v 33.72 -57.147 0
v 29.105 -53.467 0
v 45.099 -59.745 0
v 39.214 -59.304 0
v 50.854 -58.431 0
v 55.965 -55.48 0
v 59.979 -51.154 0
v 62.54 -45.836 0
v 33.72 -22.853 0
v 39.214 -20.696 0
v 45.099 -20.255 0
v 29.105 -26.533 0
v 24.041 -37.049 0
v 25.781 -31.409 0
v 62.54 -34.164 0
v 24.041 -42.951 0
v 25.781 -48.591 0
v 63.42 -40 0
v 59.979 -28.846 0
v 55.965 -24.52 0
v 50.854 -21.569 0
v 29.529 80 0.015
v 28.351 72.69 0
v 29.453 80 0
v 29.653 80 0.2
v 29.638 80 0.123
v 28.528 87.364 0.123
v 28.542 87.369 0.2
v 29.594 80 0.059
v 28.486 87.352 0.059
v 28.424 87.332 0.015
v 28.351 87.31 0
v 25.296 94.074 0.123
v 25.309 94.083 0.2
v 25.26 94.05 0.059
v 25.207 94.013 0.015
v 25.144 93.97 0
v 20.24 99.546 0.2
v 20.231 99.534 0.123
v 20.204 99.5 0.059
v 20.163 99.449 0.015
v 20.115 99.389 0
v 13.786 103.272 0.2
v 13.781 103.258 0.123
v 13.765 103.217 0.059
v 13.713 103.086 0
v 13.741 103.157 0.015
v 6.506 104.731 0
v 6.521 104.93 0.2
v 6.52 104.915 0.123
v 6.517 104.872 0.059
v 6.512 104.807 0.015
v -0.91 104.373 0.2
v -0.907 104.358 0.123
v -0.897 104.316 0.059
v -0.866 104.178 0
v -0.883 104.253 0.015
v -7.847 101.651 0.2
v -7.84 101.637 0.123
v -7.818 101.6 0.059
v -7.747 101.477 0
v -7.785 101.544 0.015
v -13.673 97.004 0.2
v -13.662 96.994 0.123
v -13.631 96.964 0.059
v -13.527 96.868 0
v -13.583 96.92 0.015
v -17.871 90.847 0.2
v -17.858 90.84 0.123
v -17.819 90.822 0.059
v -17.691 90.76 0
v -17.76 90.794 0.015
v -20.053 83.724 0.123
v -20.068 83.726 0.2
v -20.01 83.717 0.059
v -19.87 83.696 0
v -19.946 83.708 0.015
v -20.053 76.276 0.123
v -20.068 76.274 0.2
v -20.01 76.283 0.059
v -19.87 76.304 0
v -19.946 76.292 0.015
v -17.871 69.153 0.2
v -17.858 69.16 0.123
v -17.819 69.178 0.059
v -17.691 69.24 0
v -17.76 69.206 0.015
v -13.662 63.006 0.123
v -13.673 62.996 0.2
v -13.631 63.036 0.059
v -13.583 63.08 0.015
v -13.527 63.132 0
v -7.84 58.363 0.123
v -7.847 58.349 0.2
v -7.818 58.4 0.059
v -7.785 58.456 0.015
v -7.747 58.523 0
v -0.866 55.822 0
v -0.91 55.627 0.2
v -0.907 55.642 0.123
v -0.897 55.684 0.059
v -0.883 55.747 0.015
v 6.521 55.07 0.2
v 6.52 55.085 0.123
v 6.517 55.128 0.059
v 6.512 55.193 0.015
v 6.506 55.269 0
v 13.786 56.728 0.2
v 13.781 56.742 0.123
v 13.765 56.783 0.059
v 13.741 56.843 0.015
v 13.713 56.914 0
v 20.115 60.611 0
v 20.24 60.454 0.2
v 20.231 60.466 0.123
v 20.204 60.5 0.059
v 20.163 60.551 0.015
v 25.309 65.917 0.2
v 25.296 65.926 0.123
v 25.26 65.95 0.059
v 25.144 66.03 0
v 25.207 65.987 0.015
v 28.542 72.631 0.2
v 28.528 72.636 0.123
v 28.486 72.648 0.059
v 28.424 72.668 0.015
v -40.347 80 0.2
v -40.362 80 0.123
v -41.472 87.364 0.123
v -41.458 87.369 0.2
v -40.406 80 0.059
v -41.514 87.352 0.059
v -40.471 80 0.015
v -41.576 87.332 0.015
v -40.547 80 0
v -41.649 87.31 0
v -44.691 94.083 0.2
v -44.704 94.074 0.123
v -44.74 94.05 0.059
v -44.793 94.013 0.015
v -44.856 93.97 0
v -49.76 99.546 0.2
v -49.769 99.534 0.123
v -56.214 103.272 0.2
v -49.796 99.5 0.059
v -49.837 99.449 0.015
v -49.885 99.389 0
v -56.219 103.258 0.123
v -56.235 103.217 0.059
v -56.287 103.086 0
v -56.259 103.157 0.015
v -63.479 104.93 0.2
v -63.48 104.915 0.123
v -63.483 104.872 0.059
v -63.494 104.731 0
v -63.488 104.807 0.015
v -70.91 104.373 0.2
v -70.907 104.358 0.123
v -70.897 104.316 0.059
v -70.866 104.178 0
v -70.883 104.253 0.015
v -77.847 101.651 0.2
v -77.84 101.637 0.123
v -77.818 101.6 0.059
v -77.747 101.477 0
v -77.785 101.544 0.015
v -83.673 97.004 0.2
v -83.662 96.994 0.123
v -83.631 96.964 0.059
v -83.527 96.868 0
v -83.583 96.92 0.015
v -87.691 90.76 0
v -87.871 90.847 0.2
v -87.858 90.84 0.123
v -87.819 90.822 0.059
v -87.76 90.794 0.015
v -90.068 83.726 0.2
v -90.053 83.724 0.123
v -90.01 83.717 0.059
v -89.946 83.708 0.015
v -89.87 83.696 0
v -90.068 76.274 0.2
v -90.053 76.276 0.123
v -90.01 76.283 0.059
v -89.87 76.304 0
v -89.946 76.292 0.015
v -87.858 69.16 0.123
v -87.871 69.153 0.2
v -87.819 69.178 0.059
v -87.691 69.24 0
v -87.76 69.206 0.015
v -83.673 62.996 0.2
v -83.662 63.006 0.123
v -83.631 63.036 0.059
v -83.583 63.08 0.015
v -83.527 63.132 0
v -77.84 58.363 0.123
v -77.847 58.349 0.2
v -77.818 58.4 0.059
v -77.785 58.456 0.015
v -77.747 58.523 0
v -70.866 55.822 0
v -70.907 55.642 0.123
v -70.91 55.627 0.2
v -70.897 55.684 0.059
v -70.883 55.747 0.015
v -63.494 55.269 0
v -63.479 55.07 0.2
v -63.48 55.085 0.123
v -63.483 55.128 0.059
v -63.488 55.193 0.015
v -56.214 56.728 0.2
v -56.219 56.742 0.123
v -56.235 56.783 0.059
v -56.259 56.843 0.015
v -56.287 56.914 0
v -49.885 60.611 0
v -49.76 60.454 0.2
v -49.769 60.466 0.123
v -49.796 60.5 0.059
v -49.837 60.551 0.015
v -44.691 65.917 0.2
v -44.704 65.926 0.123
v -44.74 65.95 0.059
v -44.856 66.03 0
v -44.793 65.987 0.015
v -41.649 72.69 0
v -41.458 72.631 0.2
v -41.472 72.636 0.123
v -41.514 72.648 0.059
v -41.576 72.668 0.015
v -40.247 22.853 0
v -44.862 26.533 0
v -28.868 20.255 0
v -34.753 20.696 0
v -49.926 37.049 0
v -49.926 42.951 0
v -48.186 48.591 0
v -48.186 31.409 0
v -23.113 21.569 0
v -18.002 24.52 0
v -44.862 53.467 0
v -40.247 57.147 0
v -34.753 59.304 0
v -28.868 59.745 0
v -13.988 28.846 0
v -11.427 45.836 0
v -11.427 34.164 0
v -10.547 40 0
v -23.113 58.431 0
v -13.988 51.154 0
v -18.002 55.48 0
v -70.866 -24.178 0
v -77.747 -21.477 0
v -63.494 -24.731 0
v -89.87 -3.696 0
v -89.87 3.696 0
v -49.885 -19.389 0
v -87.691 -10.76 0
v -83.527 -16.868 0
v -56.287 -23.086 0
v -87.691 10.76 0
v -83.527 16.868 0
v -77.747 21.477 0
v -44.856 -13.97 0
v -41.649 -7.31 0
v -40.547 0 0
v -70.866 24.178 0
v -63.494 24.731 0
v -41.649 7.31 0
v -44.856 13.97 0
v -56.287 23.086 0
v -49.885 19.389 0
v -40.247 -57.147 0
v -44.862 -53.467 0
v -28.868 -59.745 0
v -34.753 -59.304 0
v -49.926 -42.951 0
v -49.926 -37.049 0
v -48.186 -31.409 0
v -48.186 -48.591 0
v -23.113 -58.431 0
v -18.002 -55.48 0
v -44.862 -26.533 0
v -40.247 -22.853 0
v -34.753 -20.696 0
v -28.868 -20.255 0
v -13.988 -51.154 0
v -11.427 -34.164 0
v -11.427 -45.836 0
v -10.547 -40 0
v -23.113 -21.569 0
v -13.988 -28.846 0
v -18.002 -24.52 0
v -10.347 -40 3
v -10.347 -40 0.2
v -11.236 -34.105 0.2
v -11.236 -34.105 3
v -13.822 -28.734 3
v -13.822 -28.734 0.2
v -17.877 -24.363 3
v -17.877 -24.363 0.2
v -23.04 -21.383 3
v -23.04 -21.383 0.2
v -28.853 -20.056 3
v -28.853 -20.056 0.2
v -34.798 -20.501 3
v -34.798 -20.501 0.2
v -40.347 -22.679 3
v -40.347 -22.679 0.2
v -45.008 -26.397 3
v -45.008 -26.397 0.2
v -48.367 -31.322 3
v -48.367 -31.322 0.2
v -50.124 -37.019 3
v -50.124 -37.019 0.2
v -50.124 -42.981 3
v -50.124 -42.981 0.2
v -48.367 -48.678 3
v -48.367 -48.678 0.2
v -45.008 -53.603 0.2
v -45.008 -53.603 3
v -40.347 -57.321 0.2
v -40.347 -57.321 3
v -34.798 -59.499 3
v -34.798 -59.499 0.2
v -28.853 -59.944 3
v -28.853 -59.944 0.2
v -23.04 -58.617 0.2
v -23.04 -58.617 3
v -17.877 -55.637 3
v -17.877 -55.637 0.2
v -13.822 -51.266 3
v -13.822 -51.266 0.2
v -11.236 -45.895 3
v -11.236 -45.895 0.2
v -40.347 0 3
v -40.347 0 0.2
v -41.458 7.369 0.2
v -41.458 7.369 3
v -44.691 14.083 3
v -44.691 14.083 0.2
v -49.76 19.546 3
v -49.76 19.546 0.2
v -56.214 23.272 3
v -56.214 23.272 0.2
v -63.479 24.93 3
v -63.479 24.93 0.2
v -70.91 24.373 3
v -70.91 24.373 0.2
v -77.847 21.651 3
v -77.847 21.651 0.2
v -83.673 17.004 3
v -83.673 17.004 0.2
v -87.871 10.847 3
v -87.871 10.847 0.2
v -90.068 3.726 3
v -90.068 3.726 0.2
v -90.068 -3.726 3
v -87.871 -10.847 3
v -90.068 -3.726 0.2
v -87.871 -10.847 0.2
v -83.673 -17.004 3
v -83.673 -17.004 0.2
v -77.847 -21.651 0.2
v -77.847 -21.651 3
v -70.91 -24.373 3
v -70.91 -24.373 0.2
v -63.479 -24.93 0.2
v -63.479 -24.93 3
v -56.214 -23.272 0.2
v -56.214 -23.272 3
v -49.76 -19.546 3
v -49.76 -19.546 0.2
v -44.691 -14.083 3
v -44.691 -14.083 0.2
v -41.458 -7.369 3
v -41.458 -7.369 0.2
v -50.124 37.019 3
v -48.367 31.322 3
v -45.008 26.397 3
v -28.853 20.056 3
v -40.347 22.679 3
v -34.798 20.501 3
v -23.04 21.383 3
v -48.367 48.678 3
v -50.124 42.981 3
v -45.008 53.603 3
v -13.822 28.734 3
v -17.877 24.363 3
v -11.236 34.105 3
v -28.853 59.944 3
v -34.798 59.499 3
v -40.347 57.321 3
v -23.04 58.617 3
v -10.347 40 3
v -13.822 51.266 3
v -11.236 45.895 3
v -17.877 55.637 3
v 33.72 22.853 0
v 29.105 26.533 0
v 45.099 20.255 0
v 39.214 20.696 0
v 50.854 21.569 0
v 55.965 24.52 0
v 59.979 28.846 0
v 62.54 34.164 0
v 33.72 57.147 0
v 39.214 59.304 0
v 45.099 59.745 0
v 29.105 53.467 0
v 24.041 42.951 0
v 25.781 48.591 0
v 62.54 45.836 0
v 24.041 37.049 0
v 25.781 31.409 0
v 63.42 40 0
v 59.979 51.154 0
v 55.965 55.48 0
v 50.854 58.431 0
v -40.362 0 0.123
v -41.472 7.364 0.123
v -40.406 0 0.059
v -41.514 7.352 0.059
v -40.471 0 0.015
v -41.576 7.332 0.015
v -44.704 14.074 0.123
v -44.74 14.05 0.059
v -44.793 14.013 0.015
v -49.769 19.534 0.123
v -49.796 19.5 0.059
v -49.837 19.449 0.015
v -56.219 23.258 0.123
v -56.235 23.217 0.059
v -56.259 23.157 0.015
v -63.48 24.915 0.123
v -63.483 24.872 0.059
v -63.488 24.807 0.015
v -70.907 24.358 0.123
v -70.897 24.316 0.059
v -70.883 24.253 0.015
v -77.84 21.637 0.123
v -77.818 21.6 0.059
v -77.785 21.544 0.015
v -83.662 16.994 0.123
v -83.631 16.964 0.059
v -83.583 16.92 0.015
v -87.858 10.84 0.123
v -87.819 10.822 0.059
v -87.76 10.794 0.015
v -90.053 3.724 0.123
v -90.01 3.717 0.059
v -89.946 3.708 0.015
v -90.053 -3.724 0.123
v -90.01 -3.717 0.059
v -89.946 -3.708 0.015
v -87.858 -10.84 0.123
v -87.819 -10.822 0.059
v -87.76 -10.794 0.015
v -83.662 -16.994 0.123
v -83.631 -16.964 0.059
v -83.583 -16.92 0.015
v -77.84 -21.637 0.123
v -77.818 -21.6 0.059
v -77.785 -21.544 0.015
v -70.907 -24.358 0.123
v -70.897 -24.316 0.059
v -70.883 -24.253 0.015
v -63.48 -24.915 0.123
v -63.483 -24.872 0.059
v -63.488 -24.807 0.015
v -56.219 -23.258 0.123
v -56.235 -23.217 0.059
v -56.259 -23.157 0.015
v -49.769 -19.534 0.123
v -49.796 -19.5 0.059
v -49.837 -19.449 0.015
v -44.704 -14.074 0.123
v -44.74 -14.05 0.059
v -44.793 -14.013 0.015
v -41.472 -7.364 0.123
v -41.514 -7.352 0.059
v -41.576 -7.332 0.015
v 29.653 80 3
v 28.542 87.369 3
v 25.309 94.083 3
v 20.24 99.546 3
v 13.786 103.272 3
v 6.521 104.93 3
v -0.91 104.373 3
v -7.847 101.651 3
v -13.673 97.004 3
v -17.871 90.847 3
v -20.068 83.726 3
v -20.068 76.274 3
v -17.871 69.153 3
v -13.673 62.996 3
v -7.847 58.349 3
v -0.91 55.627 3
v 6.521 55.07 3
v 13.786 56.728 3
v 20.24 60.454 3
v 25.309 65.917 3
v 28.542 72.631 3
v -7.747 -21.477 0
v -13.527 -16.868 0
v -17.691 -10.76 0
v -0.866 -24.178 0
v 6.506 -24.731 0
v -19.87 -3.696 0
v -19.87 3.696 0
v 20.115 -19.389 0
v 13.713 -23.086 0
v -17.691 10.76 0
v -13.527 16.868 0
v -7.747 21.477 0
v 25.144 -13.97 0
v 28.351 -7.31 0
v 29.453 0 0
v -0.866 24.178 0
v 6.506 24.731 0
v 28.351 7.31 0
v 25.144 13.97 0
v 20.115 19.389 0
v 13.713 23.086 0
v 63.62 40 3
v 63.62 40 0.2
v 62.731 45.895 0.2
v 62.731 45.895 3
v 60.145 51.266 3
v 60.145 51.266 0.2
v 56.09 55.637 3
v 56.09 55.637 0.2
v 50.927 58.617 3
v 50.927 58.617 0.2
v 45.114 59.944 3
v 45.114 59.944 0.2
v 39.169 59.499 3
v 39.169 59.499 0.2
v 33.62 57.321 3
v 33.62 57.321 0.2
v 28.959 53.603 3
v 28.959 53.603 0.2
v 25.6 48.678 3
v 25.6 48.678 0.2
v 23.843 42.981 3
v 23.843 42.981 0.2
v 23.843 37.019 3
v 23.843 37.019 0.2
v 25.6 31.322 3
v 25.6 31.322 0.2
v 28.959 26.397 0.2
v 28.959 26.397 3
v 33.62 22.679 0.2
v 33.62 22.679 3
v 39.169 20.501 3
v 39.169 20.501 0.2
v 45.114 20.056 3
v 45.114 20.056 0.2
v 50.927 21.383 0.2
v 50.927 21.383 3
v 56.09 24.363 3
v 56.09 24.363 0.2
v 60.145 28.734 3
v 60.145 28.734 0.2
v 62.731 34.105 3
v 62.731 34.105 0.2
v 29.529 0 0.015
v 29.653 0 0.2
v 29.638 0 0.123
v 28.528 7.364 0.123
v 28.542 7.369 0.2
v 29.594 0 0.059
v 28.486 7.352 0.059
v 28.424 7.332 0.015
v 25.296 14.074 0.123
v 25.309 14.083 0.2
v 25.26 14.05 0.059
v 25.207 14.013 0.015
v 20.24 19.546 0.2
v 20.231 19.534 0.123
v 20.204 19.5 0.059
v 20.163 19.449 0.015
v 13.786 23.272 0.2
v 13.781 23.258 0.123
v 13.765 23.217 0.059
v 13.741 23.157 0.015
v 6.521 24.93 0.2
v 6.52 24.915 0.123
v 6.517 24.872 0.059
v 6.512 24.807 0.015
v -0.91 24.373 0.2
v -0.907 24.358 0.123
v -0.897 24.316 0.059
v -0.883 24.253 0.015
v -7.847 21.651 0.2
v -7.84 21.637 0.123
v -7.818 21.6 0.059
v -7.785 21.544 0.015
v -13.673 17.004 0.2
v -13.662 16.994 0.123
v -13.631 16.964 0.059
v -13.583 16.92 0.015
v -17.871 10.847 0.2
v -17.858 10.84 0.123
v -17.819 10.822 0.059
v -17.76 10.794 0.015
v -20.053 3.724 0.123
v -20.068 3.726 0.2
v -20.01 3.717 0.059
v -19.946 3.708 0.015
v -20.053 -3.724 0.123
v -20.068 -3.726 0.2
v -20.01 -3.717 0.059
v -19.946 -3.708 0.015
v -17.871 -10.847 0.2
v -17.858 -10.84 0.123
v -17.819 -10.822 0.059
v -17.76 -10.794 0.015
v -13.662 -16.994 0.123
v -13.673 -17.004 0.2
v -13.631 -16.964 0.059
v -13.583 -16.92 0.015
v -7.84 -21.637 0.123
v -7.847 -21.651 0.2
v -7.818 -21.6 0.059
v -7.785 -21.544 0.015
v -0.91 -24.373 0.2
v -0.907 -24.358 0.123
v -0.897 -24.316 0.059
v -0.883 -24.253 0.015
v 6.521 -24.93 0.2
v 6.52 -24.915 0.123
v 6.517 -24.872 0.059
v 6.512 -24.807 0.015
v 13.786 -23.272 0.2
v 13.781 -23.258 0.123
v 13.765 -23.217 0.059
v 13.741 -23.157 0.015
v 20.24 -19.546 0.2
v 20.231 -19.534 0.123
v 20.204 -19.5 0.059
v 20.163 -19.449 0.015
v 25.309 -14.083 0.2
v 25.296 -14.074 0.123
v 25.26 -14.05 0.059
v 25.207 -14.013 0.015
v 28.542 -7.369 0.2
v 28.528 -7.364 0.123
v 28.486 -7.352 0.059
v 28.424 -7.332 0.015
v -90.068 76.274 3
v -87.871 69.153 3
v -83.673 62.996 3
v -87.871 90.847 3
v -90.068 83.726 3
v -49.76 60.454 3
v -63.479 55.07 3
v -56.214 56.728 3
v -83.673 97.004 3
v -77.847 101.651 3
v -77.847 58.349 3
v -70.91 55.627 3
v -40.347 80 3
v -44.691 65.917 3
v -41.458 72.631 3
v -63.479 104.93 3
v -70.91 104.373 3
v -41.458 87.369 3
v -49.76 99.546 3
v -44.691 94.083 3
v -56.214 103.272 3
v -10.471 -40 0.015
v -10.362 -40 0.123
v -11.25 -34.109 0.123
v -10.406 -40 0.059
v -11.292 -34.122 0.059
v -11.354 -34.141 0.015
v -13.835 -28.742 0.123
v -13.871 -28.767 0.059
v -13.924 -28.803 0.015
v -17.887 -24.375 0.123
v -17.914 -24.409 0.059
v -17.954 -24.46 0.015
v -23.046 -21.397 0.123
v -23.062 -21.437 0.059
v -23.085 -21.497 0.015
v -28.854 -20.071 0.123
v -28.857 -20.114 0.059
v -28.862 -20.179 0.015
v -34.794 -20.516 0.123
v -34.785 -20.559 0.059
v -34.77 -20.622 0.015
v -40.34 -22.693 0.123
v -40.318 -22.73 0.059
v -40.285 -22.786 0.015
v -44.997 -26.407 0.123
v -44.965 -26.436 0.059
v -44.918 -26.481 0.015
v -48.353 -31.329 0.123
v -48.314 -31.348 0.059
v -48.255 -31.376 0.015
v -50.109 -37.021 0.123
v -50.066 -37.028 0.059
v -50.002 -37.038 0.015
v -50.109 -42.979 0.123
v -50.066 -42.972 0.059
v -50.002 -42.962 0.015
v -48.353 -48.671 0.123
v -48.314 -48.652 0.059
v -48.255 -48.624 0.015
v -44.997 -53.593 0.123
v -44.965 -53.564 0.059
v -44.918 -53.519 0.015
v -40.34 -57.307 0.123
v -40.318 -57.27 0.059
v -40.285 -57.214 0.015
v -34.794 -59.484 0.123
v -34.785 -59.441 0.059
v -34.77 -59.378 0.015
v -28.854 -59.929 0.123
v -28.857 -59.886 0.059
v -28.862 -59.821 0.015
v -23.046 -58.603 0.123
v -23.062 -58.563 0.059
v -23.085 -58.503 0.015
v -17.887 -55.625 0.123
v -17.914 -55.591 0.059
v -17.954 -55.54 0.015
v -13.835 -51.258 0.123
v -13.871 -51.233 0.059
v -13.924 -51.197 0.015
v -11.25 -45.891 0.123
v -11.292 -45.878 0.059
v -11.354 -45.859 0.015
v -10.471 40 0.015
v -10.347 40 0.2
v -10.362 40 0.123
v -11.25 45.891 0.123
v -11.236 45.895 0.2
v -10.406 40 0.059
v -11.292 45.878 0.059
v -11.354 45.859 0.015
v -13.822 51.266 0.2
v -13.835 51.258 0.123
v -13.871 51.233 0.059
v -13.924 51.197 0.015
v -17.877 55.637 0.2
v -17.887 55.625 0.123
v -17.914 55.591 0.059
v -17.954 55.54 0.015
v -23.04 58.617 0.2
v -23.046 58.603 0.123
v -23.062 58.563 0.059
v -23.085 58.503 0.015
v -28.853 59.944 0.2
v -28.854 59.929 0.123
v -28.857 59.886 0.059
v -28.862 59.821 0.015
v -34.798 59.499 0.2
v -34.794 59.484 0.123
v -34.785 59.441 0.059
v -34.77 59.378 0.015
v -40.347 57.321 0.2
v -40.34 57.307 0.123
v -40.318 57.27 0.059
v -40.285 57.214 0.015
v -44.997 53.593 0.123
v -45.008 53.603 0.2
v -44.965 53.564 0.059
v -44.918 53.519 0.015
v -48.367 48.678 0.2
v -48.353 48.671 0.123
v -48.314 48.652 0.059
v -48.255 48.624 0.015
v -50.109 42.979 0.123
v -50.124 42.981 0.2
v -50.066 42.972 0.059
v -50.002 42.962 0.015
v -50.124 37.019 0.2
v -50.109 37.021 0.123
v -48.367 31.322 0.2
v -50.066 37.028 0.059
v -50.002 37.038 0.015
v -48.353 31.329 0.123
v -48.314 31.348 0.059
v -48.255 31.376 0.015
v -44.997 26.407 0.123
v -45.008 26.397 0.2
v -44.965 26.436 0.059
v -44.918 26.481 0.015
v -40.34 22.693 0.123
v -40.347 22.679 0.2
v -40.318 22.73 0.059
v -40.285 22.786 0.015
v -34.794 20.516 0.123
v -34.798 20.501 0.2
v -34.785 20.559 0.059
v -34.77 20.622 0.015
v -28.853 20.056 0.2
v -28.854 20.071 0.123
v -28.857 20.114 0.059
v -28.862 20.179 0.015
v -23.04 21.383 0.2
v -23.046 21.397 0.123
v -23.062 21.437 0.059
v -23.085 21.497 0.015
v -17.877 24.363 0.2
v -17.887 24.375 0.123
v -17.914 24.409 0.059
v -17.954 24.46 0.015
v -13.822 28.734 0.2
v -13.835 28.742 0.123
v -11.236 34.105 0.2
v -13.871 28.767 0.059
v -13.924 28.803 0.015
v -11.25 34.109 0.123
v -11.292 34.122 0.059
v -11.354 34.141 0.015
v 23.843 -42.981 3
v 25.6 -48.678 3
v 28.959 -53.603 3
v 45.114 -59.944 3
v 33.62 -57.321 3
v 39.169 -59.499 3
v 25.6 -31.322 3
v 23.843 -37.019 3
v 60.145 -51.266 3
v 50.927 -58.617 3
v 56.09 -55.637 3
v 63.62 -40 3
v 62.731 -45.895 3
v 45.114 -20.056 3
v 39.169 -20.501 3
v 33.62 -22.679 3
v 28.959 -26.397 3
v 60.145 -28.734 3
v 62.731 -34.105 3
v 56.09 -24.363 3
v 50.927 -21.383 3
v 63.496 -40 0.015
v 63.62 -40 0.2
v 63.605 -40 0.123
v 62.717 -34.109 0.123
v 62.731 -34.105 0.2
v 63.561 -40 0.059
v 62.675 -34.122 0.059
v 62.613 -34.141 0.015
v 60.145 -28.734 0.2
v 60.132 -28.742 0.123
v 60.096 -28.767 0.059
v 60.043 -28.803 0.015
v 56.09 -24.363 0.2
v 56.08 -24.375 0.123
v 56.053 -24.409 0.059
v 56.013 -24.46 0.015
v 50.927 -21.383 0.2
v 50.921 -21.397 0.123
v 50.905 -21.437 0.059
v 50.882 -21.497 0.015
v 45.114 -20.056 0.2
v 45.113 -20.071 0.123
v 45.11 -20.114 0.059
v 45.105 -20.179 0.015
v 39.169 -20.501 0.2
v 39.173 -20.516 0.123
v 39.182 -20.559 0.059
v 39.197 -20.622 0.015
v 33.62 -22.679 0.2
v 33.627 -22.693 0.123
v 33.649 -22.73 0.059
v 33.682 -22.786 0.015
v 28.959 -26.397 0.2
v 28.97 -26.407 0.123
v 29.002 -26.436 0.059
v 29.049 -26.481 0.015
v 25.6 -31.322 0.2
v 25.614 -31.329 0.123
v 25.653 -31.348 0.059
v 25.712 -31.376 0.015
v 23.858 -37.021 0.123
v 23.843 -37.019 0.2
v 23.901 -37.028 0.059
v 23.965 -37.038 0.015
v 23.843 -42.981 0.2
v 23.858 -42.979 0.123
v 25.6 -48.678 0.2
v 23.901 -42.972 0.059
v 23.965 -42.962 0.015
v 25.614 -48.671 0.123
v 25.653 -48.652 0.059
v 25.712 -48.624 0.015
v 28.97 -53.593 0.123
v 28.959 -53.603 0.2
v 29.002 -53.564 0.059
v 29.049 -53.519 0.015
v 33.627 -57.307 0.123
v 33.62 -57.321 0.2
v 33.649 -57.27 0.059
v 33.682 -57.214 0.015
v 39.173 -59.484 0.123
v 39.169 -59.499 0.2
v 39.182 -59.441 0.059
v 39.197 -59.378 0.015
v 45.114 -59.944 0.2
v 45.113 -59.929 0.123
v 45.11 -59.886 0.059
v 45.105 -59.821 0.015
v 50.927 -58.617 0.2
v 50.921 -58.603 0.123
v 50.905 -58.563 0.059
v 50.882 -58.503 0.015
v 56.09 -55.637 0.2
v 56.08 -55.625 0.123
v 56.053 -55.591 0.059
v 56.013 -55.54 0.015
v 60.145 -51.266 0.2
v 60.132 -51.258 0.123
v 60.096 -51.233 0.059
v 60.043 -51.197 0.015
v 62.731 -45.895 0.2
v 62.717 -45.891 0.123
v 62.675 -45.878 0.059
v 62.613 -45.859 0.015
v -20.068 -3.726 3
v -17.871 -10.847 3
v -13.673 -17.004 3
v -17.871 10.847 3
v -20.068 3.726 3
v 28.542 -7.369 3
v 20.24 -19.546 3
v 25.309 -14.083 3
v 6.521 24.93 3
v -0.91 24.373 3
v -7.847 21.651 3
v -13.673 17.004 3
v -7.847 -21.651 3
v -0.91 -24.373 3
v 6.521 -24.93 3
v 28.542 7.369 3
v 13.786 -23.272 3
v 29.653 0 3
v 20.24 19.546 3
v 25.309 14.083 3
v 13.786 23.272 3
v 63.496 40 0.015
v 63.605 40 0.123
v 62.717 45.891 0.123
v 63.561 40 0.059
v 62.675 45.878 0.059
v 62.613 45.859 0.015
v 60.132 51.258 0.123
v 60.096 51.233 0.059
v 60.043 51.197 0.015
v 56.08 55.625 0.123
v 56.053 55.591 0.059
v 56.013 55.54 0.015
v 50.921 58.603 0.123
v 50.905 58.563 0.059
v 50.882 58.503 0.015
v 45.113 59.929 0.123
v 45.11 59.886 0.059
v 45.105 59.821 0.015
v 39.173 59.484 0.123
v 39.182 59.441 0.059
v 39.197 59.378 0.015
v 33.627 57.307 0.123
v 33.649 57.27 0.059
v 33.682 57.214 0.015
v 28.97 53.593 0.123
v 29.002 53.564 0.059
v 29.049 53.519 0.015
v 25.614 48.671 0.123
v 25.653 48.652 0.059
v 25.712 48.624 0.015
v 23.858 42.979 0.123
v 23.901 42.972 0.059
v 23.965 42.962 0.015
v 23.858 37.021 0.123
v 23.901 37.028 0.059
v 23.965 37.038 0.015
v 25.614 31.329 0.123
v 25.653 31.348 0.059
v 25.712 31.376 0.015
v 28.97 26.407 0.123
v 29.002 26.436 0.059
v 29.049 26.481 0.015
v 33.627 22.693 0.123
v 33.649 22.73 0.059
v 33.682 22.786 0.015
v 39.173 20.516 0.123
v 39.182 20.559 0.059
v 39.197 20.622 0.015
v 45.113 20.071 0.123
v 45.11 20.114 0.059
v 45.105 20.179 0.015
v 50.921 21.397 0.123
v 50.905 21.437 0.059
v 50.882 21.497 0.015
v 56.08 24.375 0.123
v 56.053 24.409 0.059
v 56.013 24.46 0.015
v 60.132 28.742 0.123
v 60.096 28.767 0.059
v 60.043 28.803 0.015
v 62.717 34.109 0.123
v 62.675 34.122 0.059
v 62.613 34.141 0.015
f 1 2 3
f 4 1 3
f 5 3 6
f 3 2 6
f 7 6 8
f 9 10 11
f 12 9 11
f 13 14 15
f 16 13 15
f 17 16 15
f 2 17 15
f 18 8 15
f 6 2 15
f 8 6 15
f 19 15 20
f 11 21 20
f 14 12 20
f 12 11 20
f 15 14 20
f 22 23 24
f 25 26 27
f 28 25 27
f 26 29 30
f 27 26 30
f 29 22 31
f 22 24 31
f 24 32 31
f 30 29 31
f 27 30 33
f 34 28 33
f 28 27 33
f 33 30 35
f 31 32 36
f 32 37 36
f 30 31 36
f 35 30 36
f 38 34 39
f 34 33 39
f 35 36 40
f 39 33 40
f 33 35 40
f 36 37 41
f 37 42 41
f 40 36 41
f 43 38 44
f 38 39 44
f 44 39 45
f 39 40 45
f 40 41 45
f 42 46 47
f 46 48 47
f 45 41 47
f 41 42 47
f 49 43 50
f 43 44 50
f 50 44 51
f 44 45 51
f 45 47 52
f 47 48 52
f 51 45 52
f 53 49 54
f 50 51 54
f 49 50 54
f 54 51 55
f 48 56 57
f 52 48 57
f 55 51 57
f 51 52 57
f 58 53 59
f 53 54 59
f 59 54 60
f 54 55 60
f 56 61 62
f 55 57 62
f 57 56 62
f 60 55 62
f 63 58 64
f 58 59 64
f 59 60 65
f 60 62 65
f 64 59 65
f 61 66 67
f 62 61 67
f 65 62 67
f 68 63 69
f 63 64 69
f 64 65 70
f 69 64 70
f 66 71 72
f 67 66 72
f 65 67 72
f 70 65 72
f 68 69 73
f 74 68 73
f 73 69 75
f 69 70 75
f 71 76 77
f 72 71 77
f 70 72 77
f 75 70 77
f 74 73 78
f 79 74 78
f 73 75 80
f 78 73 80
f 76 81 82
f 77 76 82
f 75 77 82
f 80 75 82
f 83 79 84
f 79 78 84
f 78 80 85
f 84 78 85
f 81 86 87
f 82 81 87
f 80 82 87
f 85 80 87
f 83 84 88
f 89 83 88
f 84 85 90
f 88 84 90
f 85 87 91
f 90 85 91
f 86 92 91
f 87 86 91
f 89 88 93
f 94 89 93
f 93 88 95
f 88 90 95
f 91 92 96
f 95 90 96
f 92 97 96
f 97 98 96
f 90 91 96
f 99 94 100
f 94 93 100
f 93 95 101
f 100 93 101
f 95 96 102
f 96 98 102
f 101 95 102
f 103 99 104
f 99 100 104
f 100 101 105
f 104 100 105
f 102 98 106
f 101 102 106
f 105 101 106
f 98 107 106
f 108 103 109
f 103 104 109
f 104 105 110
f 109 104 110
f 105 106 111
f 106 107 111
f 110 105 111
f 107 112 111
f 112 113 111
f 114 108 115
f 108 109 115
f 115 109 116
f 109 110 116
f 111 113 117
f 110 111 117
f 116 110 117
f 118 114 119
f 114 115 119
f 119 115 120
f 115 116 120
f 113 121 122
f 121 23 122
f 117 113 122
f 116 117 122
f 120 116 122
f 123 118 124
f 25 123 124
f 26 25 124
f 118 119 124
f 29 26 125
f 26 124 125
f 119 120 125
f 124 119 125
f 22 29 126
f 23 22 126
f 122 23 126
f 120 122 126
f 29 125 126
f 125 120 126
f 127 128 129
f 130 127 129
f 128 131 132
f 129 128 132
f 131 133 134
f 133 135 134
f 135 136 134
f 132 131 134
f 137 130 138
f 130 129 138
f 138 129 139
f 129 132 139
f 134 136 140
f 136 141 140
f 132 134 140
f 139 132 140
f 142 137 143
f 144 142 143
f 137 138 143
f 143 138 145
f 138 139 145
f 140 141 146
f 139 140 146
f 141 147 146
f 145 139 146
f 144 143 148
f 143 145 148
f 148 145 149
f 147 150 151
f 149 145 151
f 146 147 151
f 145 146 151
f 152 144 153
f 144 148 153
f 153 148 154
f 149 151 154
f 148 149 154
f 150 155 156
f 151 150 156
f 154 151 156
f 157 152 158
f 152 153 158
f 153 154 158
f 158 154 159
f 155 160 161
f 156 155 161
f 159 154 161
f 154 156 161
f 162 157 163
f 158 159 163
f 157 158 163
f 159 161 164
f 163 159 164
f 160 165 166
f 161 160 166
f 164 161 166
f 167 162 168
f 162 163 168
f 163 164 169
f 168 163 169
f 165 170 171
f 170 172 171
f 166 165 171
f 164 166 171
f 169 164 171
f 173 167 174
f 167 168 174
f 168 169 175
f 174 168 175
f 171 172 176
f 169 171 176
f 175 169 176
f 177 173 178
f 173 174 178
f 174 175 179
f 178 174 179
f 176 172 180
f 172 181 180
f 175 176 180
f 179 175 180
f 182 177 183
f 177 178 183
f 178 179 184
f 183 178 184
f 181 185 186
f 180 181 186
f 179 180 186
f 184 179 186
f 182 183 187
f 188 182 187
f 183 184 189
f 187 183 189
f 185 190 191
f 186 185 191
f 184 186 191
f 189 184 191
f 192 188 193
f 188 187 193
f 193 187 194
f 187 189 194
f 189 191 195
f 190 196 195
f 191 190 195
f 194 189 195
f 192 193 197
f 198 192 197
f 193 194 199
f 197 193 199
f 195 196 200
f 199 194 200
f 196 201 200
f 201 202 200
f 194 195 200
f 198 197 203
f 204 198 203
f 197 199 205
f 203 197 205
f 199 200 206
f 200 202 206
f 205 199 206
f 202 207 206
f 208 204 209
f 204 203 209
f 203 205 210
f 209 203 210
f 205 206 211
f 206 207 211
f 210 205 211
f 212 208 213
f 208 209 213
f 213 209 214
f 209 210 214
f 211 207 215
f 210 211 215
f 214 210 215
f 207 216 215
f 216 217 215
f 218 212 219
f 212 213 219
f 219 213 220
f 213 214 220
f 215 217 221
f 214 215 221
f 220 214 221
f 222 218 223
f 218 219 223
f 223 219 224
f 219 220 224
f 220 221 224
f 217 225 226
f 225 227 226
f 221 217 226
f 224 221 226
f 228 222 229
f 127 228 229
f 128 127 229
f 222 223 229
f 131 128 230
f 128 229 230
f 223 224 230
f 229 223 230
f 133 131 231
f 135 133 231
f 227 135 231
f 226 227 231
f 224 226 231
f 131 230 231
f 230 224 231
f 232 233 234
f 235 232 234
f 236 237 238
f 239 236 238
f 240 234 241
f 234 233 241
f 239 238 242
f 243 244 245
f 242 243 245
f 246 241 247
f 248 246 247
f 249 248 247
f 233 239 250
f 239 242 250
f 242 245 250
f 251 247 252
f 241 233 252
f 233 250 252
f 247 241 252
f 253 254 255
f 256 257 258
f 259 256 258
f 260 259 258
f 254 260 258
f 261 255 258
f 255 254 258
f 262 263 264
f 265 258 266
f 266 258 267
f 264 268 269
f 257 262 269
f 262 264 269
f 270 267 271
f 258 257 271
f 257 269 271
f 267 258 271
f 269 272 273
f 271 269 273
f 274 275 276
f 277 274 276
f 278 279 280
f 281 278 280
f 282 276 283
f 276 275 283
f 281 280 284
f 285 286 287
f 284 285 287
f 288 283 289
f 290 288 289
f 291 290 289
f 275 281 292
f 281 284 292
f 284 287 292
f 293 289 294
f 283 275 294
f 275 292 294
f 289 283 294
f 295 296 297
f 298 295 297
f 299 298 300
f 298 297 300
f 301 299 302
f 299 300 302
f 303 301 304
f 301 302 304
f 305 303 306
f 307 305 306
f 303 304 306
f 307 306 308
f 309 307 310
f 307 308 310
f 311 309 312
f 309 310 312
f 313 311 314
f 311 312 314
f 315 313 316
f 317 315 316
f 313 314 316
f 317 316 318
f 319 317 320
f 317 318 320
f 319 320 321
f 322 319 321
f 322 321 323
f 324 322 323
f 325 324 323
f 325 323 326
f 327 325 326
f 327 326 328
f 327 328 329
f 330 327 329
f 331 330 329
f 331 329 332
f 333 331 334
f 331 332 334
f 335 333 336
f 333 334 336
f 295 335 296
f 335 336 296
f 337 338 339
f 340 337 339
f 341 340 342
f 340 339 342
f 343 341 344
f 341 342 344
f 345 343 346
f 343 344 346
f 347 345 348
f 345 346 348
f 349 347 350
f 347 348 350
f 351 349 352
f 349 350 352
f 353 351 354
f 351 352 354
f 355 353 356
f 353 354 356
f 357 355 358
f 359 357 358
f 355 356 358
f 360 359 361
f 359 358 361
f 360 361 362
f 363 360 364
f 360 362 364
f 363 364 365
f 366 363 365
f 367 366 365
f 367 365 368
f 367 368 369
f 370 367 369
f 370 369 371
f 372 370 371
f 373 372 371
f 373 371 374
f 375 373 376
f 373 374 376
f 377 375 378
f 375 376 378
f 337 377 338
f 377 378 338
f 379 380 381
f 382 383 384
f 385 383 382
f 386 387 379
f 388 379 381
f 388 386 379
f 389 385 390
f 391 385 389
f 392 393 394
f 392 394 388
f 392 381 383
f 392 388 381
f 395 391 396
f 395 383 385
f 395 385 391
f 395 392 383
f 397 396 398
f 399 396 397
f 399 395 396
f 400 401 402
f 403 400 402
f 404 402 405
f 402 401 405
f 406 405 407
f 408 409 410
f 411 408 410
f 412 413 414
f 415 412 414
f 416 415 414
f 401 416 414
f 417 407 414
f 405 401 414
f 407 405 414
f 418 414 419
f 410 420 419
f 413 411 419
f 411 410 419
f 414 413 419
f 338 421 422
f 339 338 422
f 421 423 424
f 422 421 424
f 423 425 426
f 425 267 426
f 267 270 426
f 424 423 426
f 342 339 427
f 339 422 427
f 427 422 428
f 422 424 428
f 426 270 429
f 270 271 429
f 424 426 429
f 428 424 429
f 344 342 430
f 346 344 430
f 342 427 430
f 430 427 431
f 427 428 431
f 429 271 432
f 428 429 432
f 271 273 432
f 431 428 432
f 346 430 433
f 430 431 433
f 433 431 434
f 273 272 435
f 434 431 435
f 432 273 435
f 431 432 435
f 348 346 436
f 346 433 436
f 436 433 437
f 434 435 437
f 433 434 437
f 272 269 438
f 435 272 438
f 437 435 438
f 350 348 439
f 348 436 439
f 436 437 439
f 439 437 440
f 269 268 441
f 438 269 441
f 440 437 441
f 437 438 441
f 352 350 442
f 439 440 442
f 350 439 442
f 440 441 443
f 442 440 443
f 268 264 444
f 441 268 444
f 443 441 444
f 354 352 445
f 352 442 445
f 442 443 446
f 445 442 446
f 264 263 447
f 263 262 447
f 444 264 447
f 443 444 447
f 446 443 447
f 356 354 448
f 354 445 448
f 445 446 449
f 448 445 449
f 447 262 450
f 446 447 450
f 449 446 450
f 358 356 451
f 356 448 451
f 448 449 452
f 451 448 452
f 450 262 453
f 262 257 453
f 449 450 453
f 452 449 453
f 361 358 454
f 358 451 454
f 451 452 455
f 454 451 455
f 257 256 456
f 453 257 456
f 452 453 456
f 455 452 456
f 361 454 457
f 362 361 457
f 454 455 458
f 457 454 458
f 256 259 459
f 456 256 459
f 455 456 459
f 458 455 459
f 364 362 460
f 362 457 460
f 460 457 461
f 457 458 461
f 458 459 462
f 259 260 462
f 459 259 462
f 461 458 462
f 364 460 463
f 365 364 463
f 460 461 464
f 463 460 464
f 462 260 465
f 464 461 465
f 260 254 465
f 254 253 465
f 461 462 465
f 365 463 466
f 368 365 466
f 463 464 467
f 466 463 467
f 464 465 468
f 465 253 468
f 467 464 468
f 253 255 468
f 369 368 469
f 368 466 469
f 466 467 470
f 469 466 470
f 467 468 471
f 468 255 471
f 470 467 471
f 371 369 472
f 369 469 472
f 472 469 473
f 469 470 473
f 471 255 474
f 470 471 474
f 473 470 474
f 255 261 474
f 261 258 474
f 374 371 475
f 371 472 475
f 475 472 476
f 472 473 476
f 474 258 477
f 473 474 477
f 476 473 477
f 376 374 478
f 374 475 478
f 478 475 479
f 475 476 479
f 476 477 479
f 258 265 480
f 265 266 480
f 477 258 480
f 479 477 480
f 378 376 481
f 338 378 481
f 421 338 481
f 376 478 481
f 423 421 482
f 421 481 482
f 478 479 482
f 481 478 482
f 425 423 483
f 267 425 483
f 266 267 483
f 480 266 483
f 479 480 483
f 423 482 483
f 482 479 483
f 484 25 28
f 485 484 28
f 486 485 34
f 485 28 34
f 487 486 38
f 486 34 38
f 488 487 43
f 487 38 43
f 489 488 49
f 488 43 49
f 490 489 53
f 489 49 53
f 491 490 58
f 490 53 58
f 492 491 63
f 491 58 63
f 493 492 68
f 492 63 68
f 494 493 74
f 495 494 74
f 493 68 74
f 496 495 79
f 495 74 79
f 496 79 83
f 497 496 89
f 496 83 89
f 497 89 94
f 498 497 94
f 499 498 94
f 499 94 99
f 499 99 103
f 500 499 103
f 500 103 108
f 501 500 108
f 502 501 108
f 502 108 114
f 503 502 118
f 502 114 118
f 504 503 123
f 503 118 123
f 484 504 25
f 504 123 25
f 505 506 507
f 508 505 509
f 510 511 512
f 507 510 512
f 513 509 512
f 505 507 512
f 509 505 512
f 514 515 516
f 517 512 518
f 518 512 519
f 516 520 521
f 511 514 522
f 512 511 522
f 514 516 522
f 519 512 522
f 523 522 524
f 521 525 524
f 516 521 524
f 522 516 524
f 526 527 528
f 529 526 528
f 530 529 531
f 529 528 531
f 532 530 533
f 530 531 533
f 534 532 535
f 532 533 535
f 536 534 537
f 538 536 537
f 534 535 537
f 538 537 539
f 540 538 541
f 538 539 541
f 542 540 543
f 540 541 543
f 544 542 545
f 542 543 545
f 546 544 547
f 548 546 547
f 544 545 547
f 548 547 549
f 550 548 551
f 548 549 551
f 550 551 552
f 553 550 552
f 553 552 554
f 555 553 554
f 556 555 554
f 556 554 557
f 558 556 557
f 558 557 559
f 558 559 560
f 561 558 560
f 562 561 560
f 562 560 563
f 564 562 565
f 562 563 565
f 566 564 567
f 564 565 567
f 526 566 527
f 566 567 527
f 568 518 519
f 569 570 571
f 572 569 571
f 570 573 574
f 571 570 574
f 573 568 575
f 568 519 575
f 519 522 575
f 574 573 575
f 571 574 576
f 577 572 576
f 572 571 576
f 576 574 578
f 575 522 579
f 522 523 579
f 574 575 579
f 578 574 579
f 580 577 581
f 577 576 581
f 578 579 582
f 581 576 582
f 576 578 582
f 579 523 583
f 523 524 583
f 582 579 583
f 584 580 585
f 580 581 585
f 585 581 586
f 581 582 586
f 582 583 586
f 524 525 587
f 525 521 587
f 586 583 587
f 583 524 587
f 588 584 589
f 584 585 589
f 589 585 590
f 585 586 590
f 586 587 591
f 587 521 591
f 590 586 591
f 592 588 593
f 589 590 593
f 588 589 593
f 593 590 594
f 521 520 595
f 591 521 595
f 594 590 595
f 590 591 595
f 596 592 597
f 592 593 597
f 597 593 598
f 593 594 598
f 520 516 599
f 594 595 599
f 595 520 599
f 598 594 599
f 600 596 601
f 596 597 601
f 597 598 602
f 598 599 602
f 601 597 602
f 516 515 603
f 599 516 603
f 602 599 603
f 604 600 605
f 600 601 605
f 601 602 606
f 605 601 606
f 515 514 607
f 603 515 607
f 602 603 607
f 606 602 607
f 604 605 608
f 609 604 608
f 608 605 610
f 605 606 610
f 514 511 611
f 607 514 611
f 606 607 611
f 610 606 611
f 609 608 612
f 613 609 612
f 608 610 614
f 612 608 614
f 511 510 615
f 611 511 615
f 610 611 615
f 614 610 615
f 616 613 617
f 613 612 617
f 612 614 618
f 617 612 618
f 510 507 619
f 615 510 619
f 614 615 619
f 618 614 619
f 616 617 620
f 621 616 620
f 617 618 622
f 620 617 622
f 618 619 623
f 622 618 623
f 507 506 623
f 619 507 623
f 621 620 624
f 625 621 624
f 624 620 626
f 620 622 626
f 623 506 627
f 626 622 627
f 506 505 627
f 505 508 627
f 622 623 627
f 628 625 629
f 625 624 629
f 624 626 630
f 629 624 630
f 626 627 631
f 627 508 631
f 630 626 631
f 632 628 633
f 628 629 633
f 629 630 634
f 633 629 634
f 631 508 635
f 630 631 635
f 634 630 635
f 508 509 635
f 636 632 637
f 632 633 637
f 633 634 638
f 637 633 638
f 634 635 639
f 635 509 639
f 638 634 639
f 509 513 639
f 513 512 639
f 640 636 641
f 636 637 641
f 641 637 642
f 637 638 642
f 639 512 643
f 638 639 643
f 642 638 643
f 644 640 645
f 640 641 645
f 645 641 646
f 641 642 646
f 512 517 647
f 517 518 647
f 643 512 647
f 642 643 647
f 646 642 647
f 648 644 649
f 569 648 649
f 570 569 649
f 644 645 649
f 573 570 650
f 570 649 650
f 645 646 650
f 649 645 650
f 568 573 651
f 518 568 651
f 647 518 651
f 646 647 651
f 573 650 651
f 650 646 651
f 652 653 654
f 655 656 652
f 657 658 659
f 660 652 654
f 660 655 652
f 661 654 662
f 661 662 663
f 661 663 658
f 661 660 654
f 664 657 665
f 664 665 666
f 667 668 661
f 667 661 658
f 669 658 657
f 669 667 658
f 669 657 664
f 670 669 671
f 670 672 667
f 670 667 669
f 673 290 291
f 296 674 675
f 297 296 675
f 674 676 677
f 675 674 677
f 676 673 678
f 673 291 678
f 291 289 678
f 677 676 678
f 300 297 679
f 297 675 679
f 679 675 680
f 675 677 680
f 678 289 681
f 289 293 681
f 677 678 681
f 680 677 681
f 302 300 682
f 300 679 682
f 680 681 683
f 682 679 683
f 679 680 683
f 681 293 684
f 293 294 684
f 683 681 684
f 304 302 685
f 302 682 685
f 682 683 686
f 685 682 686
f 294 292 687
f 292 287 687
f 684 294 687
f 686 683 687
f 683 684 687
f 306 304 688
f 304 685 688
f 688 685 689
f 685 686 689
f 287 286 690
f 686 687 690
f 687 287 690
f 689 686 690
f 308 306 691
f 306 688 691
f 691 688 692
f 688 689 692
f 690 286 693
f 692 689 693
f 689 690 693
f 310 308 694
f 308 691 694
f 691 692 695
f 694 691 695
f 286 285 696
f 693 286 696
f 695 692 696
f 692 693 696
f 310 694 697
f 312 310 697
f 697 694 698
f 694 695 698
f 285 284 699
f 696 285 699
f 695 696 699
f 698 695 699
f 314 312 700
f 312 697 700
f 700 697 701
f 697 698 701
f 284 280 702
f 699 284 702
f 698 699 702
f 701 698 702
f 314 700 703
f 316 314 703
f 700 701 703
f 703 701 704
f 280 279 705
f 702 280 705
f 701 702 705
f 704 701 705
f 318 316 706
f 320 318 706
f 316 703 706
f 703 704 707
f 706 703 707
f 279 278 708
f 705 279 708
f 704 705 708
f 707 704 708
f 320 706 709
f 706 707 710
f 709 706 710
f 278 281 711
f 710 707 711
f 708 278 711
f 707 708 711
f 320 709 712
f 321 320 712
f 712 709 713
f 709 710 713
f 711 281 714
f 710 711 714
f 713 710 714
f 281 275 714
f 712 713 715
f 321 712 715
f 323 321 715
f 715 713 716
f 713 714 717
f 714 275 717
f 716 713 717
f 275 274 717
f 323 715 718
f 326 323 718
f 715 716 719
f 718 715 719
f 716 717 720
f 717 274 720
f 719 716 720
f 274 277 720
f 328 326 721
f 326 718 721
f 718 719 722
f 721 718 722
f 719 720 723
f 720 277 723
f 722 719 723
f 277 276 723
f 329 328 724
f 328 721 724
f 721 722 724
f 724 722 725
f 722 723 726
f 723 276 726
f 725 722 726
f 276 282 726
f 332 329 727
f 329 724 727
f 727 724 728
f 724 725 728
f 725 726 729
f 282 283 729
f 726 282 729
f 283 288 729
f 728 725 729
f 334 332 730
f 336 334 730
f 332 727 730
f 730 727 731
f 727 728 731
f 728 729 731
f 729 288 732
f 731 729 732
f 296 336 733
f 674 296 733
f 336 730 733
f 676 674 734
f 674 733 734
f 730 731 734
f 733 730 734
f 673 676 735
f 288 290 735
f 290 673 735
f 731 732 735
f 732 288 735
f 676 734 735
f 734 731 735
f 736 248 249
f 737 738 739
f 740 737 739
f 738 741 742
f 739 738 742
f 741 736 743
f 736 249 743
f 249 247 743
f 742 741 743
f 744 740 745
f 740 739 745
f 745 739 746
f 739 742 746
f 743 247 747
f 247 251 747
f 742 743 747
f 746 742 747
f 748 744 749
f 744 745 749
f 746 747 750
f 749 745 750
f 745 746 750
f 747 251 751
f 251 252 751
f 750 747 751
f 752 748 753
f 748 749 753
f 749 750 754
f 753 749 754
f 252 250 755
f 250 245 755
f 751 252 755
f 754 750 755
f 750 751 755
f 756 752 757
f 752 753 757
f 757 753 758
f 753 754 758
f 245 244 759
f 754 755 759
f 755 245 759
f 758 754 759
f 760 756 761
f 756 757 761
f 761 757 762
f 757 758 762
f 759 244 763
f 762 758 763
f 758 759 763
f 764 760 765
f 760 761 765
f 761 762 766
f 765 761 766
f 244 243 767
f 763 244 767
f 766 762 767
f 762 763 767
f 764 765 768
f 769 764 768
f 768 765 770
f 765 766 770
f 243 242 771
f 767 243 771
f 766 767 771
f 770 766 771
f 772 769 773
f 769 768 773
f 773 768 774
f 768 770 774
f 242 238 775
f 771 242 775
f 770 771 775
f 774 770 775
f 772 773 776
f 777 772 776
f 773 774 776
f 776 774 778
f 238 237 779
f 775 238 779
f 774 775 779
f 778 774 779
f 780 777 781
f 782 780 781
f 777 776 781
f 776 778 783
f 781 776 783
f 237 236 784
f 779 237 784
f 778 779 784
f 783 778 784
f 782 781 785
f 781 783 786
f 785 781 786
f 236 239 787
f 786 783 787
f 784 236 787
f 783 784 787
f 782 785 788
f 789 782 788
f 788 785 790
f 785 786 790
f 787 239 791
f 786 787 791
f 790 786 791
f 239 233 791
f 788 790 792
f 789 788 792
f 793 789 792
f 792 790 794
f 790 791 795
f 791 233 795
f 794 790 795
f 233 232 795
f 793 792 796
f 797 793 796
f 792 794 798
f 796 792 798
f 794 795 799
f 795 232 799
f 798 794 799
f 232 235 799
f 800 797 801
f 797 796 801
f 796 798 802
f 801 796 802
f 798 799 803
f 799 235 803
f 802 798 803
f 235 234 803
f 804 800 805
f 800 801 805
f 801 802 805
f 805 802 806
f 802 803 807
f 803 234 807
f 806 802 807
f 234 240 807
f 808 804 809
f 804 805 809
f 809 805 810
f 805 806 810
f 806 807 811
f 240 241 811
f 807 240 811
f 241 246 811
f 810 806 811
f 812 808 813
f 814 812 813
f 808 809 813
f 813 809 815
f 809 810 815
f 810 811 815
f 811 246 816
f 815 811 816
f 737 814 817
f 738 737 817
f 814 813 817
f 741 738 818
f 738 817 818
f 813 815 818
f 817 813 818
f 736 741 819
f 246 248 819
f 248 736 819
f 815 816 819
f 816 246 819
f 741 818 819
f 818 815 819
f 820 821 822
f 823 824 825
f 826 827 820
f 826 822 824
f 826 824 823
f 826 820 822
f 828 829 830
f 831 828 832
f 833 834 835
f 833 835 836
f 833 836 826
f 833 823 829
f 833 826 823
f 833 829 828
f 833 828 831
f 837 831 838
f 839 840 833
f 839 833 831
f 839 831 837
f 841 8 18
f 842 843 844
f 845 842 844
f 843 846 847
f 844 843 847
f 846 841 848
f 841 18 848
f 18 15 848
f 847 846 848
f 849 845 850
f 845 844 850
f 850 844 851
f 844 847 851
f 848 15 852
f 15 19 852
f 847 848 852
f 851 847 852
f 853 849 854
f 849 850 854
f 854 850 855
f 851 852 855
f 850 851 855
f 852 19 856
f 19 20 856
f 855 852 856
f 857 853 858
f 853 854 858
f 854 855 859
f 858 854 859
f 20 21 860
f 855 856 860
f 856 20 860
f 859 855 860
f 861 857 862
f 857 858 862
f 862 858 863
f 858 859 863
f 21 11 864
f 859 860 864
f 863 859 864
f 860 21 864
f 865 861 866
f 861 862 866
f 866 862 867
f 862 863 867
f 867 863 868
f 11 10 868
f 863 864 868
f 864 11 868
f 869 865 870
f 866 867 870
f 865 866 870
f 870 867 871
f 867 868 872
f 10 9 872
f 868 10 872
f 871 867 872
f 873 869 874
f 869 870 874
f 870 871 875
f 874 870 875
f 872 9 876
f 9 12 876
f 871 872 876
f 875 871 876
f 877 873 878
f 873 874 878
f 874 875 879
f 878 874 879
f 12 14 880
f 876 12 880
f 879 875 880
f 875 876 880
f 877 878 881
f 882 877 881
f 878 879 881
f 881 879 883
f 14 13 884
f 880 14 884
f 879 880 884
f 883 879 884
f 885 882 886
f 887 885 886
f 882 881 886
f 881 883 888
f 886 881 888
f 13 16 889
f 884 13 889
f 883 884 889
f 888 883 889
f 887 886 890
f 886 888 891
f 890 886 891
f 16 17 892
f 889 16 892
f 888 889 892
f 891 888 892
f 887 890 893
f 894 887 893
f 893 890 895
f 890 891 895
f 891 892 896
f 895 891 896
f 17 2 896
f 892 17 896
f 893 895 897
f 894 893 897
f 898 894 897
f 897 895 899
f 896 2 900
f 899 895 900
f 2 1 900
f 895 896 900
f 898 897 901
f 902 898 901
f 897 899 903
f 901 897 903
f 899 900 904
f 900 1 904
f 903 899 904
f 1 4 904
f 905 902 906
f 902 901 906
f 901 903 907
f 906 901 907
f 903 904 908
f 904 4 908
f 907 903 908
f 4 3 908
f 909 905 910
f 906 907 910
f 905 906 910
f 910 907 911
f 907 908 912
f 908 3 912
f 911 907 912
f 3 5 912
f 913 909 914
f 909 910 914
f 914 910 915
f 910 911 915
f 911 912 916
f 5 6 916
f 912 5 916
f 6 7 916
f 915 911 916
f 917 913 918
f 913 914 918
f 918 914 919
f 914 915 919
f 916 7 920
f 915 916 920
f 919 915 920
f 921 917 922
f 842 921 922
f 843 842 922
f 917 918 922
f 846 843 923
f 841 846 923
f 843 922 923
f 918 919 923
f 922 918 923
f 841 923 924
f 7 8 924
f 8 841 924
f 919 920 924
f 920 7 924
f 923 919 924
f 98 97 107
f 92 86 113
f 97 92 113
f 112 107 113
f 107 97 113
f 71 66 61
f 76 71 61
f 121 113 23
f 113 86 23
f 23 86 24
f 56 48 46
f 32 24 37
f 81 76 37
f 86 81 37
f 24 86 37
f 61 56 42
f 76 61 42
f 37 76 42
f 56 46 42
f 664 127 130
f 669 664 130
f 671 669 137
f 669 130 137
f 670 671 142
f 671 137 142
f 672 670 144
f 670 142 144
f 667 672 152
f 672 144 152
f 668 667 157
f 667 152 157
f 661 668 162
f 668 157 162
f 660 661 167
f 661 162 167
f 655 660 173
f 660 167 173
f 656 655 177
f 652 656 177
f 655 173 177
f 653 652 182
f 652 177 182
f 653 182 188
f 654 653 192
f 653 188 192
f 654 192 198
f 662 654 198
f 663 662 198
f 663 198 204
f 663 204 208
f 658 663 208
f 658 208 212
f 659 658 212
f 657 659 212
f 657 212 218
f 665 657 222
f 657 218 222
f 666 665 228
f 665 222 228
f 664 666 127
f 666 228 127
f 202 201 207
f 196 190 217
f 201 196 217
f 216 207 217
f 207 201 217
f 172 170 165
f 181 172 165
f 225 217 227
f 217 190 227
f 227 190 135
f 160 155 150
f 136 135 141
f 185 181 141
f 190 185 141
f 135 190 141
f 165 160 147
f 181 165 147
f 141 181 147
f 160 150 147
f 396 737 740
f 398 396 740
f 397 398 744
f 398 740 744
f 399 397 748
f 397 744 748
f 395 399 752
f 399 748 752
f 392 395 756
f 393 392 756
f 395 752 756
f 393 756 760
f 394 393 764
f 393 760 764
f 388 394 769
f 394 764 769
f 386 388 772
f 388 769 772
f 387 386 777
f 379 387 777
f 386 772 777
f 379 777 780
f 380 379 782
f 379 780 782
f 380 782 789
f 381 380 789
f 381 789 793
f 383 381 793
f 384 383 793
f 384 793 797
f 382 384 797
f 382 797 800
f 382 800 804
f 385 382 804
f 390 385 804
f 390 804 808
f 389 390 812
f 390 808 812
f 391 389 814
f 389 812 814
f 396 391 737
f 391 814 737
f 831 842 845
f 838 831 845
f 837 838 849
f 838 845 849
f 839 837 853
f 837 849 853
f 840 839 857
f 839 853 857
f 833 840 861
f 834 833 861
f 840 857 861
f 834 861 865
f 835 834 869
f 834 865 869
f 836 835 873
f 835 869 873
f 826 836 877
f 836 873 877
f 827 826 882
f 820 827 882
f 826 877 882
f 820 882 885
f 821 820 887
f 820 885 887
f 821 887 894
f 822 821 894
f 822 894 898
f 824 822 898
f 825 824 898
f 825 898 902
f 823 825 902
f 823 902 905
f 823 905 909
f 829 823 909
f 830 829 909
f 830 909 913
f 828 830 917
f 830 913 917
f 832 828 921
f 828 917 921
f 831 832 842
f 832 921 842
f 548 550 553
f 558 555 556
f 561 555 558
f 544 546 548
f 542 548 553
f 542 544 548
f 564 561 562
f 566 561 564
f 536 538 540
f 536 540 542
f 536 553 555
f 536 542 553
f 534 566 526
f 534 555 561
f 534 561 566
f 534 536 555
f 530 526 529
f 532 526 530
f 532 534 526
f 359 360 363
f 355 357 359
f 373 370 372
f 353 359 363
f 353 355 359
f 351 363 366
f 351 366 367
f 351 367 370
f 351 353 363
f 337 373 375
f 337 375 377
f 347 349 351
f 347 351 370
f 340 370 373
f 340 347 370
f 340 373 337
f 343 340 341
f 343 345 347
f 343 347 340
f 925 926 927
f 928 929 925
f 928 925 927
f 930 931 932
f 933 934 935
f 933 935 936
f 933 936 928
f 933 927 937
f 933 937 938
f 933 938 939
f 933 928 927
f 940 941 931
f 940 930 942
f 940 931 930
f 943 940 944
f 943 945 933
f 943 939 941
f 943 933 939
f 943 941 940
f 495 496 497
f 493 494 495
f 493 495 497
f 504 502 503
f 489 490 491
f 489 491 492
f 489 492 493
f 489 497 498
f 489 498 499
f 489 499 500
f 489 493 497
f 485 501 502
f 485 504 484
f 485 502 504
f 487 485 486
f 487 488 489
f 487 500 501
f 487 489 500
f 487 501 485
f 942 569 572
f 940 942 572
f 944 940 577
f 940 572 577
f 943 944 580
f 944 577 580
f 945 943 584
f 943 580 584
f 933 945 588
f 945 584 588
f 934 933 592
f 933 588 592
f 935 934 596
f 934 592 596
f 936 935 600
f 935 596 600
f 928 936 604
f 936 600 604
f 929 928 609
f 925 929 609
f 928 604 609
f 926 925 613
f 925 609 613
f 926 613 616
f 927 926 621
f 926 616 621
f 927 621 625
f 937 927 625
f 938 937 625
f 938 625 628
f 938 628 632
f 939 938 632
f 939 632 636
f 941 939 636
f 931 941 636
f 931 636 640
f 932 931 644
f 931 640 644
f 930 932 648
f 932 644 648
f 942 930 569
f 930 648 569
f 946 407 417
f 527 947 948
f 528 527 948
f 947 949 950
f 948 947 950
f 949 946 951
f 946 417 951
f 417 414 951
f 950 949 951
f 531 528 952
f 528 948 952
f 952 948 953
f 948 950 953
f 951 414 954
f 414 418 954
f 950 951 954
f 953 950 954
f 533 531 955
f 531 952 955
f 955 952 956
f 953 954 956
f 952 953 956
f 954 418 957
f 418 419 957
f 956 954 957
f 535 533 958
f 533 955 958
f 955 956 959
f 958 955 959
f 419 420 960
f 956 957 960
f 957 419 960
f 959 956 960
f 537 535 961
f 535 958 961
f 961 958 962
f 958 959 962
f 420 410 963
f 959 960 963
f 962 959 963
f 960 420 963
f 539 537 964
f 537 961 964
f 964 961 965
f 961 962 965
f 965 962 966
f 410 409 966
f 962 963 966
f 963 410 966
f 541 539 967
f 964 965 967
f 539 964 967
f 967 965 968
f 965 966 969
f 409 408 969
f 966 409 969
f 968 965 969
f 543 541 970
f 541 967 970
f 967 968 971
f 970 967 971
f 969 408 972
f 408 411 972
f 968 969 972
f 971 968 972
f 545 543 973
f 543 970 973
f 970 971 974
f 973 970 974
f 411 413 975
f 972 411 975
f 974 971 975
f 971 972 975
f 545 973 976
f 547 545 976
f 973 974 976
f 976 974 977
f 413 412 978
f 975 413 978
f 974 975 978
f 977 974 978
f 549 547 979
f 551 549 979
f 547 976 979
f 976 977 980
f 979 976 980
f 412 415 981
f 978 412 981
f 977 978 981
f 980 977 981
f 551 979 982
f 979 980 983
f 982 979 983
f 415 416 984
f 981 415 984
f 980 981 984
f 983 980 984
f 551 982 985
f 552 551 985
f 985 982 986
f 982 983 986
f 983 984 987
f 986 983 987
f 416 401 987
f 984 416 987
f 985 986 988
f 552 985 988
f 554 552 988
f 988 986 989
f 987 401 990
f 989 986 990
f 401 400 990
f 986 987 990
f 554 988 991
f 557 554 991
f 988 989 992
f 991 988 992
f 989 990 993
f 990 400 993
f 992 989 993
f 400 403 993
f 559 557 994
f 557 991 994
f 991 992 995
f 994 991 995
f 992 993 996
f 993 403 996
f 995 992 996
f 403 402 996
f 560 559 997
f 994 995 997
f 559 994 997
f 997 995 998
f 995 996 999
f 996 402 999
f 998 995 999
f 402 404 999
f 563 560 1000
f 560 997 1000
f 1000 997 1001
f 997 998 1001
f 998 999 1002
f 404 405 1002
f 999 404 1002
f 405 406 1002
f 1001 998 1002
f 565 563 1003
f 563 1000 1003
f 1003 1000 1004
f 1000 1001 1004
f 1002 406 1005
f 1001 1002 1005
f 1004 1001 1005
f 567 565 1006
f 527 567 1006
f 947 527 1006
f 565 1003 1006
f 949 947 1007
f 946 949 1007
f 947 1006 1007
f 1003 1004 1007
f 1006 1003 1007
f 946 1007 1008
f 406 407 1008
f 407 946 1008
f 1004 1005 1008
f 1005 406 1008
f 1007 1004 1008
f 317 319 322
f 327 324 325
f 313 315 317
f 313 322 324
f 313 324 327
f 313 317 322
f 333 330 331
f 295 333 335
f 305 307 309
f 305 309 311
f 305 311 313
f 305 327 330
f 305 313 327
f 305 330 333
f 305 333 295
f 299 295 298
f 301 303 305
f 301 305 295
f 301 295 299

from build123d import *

# Parameters (mm, degrees)
F0_R     = 25
F0_R_2   = 20
F1_DEPTH = 3
F2_R     = 0.2


with BuildPart() as f1:
    # F0 (on Top) → F1 (new body)
    with BuildSketch(Plane.XY):
        with Locations((-65.347192, 80)):
            Circle(F0_R)
        with Locations((4.652808, 80)):
            Circle(F0_R)
        with Locations((43.619838, 40)):
            Circle(F0_R_2)
        with Locations((-30.347192, 40)):
            Circle(F0_R_2)
        with Locations((-65.347192, 0)):
            Circle(F0_R)
        with Locations((4.652808, 0)):
            Circle(F0_R)
        with Locations((-30.347192, -40)):
            Circle(F0_R_2)
        with Locations((43.619838, -40)):
            Circle(F0_R_2)
    extrude(amount=F1_DEPTH)

    # F2
    f2_edges = [f1.edges().sort_by_distance(p)[0] for p in [
        (-90.347192, 80, 0),
        (-90.347192, 0, 0),
        (-50.347192, -40, 0),
        (-50.347192, 40, 0),
        (-20.347192, 0, 0),
        (23.619838, -40, 0),
        (-20.347192, 80, 0),
        (23.619838, 40, 0),
    ]]
    fillet(f2_edges, radius=F2_R)


solid = f1.part
